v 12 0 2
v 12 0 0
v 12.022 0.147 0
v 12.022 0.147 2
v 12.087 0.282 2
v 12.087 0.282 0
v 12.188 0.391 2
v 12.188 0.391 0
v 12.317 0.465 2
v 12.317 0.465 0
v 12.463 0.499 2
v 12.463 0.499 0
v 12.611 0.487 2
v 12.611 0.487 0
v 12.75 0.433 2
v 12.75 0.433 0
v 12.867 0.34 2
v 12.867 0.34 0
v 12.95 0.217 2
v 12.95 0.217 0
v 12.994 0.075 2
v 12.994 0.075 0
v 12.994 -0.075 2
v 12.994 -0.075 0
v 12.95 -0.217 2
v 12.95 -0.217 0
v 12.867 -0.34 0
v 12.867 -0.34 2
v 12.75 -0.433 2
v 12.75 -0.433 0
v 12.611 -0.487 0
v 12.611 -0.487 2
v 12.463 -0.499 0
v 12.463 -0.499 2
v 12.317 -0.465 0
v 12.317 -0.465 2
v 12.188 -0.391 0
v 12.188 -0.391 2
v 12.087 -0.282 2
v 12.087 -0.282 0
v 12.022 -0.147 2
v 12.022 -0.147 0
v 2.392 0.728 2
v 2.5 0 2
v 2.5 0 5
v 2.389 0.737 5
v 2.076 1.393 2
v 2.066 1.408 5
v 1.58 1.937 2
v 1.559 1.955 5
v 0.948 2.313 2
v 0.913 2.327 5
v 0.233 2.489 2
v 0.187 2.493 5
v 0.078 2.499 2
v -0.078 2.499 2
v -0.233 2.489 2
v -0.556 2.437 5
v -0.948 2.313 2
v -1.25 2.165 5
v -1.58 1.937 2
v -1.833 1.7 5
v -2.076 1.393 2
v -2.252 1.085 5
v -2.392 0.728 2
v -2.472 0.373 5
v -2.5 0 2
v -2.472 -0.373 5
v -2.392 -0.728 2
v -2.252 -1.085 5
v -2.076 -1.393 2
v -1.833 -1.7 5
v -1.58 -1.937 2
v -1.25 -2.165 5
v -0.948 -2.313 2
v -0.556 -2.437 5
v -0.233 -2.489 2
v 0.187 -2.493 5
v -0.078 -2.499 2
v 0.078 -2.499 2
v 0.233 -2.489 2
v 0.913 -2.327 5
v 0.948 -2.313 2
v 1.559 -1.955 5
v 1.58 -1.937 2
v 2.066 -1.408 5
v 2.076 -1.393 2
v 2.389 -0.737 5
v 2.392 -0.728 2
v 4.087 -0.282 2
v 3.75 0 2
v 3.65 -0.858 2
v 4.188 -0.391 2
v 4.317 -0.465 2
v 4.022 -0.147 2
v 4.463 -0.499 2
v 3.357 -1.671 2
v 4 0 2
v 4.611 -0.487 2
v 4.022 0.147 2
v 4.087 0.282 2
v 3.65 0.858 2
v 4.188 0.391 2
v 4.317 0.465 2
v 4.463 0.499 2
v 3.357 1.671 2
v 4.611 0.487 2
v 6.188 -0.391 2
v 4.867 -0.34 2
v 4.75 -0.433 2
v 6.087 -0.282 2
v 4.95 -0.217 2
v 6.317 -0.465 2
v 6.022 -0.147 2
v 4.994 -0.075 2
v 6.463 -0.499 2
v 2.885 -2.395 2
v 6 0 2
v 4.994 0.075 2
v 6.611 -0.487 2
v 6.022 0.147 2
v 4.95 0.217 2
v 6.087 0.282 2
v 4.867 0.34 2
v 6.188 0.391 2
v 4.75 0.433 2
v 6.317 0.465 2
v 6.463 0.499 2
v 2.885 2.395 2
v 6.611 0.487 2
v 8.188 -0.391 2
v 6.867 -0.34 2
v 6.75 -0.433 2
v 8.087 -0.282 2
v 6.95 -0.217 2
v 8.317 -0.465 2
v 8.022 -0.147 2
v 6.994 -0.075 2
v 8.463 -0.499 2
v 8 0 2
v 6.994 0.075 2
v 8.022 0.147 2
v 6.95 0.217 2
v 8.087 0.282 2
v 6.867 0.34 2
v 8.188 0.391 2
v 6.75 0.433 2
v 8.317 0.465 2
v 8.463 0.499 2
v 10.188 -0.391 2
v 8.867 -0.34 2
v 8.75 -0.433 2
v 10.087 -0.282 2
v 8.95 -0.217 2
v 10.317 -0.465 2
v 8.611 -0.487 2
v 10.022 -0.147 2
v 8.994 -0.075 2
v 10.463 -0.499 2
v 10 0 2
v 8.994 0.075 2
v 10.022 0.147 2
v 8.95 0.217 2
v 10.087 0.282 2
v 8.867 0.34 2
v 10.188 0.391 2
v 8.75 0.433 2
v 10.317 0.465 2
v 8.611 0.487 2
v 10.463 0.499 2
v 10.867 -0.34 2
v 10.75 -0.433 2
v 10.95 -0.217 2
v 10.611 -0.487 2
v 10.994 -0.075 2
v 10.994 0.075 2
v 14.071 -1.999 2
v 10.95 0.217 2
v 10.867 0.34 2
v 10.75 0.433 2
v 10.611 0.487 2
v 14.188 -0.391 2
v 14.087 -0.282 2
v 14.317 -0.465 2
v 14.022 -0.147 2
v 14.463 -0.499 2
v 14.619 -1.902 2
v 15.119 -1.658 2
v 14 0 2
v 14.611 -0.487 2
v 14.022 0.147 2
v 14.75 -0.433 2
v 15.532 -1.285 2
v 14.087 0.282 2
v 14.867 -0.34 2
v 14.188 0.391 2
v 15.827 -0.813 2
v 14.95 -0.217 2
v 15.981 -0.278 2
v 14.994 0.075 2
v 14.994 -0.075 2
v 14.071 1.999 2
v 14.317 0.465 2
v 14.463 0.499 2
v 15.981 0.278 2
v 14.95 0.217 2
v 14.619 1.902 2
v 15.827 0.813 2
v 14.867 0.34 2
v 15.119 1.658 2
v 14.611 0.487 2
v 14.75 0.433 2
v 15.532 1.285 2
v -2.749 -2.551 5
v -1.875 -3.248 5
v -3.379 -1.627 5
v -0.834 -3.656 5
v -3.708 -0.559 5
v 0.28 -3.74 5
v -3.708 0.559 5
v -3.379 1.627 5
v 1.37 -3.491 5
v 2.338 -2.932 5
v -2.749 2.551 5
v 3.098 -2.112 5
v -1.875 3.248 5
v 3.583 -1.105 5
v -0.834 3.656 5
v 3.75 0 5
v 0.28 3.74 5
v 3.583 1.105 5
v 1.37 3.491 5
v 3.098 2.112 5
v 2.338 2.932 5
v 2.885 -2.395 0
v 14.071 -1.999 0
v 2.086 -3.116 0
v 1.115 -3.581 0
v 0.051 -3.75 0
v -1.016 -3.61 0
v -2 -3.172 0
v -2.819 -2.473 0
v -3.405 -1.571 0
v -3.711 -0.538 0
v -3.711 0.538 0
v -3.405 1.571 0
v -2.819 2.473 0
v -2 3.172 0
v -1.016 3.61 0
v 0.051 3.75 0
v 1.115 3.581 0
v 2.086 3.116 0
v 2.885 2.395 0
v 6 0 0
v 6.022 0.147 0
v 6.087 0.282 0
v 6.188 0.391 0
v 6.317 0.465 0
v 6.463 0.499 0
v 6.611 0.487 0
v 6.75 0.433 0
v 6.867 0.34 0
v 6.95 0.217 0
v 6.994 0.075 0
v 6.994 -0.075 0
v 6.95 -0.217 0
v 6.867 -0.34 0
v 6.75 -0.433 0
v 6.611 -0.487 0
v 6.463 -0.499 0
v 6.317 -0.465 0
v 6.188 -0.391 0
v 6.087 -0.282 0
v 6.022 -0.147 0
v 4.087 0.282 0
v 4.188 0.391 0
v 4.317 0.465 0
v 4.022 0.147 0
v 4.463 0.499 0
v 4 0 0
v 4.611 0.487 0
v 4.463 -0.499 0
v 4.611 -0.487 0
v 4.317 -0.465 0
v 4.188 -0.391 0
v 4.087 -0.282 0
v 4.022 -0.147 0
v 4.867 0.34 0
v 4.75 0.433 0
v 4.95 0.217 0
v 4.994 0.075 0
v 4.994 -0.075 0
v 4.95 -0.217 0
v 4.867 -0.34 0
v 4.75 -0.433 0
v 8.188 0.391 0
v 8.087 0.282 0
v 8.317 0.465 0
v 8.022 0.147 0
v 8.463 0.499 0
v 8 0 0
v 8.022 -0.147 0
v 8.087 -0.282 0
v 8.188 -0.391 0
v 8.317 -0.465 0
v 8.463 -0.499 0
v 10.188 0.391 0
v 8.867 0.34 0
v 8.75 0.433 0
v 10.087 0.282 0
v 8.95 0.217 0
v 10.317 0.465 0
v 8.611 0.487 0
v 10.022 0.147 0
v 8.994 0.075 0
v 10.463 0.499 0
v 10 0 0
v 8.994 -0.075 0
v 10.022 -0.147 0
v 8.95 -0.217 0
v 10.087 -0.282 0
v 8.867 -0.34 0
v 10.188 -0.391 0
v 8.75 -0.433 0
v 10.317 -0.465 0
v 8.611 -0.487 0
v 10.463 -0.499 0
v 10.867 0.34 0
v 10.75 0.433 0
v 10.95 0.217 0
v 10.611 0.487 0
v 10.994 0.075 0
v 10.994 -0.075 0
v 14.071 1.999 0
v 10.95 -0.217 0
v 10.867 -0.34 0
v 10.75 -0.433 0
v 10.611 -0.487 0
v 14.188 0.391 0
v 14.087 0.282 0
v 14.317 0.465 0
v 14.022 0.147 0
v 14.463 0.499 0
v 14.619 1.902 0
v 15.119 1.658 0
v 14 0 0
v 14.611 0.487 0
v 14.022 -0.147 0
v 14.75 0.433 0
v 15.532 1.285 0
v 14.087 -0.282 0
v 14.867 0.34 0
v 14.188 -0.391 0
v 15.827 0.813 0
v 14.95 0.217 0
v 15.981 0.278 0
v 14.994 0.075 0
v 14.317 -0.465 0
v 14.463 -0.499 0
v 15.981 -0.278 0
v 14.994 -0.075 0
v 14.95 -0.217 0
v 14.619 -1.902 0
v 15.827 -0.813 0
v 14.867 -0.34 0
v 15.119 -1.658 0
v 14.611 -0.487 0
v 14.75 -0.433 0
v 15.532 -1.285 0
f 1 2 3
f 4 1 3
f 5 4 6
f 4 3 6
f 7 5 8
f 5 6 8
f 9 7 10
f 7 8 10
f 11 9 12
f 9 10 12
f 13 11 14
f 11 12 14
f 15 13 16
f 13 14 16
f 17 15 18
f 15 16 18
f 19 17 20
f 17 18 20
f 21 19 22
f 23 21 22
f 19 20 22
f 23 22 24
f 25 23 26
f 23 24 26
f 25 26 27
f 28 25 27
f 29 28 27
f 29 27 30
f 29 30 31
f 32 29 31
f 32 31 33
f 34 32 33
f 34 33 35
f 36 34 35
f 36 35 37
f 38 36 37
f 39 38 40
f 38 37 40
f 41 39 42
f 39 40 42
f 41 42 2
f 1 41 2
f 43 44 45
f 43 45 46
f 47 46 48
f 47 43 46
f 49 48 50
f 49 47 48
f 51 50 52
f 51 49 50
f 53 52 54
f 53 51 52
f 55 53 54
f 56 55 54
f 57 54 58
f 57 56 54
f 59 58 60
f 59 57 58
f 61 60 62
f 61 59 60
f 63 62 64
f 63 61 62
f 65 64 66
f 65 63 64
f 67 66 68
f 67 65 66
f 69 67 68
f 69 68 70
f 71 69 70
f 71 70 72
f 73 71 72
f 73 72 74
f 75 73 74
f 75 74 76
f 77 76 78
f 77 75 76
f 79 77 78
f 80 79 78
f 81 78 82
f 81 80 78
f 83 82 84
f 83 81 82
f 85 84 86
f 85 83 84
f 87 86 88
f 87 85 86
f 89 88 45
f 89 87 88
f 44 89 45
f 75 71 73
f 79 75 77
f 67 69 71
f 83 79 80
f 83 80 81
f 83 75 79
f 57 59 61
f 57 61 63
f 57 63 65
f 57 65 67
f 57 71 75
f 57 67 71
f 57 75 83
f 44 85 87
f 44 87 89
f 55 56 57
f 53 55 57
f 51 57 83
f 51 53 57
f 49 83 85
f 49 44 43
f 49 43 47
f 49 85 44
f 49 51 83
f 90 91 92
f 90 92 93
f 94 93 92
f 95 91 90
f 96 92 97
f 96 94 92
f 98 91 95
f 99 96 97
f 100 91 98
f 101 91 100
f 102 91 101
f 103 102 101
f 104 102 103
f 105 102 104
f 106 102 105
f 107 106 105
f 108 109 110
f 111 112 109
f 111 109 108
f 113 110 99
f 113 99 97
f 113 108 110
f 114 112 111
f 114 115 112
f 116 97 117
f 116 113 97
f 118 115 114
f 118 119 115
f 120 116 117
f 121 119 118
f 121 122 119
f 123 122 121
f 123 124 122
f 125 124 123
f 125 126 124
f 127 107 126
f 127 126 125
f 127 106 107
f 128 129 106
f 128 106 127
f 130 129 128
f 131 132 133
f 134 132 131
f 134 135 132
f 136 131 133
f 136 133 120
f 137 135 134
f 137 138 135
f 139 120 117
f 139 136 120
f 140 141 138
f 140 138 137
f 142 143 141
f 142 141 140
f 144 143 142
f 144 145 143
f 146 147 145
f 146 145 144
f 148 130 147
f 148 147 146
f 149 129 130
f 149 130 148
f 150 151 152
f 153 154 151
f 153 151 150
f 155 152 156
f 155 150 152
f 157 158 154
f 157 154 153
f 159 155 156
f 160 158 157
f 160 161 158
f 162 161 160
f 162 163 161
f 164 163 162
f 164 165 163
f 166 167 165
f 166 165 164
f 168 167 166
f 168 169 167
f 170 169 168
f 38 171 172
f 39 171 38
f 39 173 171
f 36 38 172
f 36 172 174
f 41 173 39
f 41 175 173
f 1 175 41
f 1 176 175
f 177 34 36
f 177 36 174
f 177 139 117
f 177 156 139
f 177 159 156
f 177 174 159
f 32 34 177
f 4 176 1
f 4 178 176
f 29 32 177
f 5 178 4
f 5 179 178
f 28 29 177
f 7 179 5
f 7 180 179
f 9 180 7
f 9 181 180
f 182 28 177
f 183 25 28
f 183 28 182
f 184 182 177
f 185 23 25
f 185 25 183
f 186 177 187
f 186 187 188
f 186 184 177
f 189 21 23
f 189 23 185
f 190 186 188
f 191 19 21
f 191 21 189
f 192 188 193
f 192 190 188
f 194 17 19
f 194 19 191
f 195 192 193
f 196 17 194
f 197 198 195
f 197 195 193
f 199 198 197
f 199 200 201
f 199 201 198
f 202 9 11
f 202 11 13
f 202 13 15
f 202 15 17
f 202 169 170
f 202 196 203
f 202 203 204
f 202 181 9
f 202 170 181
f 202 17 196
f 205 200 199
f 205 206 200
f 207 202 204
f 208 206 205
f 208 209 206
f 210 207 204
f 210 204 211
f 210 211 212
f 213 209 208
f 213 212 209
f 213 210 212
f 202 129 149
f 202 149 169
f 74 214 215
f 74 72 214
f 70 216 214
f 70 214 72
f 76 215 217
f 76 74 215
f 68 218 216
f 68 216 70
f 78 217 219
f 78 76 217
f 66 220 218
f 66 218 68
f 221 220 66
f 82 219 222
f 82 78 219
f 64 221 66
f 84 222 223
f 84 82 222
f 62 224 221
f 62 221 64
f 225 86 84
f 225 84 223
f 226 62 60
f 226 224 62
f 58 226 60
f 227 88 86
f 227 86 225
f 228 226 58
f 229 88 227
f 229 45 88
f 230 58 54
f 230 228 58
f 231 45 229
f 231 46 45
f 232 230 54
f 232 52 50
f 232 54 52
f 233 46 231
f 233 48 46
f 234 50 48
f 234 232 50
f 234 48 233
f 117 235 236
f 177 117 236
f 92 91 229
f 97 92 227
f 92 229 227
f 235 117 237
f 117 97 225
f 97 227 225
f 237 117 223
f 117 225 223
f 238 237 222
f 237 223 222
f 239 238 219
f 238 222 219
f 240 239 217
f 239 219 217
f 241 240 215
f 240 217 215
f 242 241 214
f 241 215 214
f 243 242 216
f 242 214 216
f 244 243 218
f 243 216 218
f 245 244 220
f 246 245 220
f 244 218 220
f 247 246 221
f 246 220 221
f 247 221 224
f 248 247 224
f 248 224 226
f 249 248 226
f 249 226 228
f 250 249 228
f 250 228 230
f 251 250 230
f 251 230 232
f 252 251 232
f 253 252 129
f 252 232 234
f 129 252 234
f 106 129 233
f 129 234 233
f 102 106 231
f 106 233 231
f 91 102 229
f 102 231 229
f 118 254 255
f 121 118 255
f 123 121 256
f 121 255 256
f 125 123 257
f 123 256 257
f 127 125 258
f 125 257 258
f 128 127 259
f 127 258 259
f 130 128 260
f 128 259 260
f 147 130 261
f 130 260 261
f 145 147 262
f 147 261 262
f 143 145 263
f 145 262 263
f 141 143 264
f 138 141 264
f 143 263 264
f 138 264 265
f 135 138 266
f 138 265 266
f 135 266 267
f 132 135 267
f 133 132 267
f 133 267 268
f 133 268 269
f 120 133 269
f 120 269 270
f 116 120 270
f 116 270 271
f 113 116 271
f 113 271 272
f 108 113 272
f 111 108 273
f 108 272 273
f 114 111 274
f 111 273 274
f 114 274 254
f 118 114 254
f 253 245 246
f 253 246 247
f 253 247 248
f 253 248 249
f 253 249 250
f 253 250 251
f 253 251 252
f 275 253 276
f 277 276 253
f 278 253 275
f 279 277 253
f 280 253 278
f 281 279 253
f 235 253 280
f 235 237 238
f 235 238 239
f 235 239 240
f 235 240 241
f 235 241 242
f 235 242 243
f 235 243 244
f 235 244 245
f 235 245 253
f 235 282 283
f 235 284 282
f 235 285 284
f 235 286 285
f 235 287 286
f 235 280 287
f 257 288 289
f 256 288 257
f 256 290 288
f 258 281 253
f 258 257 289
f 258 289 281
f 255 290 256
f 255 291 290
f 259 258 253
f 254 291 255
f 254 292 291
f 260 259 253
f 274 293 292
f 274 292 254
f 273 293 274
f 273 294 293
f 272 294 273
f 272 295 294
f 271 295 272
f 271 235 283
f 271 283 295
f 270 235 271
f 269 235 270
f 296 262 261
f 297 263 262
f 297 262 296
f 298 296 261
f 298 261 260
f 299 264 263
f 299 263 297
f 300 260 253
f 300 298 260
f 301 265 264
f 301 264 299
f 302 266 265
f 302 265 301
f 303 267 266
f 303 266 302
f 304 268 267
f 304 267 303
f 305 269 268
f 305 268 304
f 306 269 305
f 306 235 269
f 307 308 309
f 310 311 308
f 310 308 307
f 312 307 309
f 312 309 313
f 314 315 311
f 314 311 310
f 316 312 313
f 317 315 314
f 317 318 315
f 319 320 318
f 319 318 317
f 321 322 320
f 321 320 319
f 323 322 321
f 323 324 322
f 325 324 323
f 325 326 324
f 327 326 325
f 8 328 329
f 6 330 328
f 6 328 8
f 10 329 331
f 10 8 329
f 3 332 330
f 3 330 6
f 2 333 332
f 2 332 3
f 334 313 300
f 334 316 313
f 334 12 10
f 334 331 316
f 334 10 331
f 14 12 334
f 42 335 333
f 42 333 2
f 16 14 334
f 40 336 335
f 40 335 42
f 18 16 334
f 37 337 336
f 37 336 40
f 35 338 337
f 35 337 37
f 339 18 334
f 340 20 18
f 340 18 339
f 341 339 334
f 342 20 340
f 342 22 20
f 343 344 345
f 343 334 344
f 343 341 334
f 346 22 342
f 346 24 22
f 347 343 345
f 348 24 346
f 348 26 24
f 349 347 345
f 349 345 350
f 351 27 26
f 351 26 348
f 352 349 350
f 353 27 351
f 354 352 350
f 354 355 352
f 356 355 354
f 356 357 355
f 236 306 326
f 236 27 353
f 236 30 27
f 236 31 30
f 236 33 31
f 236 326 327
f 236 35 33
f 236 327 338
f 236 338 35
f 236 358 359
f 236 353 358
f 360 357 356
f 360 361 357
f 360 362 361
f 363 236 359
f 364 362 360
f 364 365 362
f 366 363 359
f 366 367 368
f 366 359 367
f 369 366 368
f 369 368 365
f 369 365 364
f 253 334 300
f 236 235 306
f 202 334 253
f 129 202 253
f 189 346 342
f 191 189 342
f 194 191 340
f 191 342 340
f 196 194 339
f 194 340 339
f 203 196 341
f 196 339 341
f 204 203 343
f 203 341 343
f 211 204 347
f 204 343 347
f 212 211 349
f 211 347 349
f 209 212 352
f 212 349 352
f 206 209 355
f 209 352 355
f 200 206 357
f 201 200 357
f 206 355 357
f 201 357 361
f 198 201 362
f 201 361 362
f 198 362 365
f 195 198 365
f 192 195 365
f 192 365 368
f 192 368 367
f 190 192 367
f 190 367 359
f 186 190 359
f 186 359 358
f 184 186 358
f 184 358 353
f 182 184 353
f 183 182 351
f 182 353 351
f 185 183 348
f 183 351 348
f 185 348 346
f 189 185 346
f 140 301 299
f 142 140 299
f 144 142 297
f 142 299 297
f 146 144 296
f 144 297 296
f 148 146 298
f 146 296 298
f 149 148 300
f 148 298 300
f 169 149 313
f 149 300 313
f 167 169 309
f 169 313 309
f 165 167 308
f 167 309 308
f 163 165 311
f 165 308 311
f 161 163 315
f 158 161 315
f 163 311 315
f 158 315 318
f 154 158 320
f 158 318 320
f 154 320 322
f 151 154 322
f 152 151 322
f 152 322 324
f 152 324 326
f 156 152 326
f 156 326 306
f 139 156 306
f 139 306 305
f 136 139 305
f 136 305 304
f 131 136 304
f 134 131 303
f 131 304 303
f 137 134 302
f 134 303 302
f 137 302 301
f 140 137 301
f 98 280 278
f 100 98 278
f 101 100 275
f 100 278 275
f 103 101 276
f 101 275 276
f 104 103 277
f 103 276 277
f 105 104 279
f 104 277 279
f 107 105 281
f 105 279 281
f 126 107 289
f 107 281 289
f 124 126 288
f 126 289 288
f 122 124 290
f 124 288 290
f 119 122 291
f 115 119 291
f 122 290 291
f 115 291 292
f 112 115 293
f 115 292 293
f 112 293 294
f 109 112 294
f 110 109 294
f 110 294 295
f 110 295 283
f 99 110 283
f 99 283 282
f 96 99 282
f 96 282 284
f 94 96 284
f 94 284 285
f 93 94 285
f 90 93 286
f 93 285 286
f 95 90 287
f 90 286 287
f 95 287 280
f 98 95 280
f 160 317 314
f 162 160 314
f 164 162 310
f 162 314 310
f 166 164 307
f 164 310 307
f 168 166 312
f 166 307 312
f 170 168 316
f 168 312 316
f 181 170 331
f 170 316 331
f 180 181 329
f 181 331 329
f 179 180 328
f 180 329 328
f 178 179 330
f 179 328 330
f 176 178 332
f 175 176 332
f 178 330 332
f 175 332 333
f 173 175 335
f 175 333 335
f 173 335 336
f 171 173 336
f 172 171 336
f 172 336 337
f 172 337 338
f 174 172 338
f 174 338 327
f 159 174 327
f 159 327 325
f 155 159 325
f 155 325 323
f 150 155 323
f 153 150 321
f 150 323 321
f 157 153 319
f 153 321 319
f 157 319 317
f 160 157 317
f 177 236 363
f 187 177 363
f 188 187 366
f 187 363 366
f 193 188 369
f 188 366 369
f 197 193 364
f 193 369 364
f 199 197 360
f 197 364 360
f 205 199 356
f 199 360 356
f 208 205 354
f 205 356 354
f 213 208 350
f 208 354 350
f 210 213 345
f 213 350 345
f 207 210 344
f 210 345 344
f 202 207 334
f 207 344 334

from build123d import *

# Parameters (mm, degrees)
EXTRUDE_3_DEPTH     = 2
EXTRUDE_3_2_DEPTH   = 2
SKETCH_2_R          = 3.75
SKETCH_2_R_2        = 2.5
EXTRUDE_5_DEPTH     = 3
SKETCH_4_R          = 0.5
CUT_EXTRUDE_1_DEPTH = 2
SKETCH_5_R          = 2.5
EXTRUDE_7_DEPTH     = 1
SKETCH_1_2_R        = 3.75
EXTRUDE_1_DEPTH     = 2


with BuildPart() as part:
    # Sketch 1 → Бобышка-Вытянуть3 (new body)
    with BuildSketch(Plane.XY):
        with BuildLine():
            Line((0, -2.497361401), (0.233236, -2.489096416))
            ThreePointArc((0.233236, -2.489096416), (2.5, 0), (0.233236, 2.489096416))
            Line((0.233236, 2.489096416), (0, 2.497361401))
            Line((0, 2.497361401), (-0.233236, 2.489096416))
            ThreePointArc((-0.233236, 2.489096416), (-2.5, 0), (-0.233236, -2.489096416))
            Line((-0.233236, -2.489096416), (0, -2.497361401))
        make_face()
    extrude(amount=EXTRUDE_3_DEPTH)



with BuildPart() as body_2:
    # Sketch 1 → Extrude 3 2 (new body)
    with BuildSketch(Plane.XY):
        with BuildLine():
            Line((14.07082784, 1.998745461), (2.88547071, 2.395111434))
            ThreePointArc((2.88547071, 2.395111434), (3.75, 0), (2.88547071, -2.395111434))
            Line((2.88547071, -2.395111434), (14.07082784, -1.998745461))
            ThreePointArc((14.07082784, -1.998745461), (16, 0), (14.07082784, 1.998745461))
        make_face()
    extrude(amount=EXTRUDE_3_2_DEPTH)

    # Эскиз4 → Вырез-Вытянуть1 (cut)
    with BuildSketch(Plane(origin=(0, 0, 0), x_dir=(-1, 0, 0), z_dir=(0, 0, -1))):
        with Locations((-14.5, 0)):
            Circle(SKETCH_4_R)
        with Locations((-4.5, 0)):
            Circle(SKETCH_4_R)
        with Locations((-6.5, 0)):
            Circle(SKETCH_4_R)
        with Locations((-8.5, 0)):
            Circle(SKETCH_4_R)
        with Locations((-10.5, 0)):
            Circle(SKETCH_4_R)
        with Locations((-12.5, 0)):
            Circle(SKETCH_4_R)
    extrude(amount=-CUT_EXTRUDE_1_DEPTH, mode=Mode.SUBTRACT)


with BuildPart() as body_3:
    # Эскиз2 → Бобышка-Вытянуть5 (new body)
    with BuildSketch(Plane.XY.offset(2)):
        Circle(SKETCH_2_R)
        Circle(SKETCH_2_R_2, mode=Mode.SUBTRACT)
    extrude(amount=EXTRUDE_5_DEPTH)


with BuildPart() as body_4:
    # Эскиз5 → Бобышка-Вытянуть7 (new body)
    with BuildSketch(Plane(origin=(0, 0, 0), x_dir=(-1, 0, 0), z_dir=(0, 0, -1))):
        Circle(SKETCH_5_R)
    extrude(amount=-EXTRUDE_7_DEPTH)


with BuildPart() as part_1:
    add(part.part)

    add(body_2.part)  # 凸台-拉伸1 merges body 2

    add(body_3.part)  # 凸台-拉伸1 merges body 3

    add(body_4.part)  # 凸台-拉伸1 merges body 4
    # Sketch 1 2 → 凸台-拉伸1 (add)
    with BuildSketch(Plane(origin=(0, 0, 2), x_dir=(-1, 0, 0), z_dir=(0, 0, -1))):
        with Locations(Location((0, 0, 0), (0, 0, 180))):
            Circle(SKETCH_1_2_R)
    extrude(amount=EXTRUDE_1_DEPTH)


solid = part_1.part
